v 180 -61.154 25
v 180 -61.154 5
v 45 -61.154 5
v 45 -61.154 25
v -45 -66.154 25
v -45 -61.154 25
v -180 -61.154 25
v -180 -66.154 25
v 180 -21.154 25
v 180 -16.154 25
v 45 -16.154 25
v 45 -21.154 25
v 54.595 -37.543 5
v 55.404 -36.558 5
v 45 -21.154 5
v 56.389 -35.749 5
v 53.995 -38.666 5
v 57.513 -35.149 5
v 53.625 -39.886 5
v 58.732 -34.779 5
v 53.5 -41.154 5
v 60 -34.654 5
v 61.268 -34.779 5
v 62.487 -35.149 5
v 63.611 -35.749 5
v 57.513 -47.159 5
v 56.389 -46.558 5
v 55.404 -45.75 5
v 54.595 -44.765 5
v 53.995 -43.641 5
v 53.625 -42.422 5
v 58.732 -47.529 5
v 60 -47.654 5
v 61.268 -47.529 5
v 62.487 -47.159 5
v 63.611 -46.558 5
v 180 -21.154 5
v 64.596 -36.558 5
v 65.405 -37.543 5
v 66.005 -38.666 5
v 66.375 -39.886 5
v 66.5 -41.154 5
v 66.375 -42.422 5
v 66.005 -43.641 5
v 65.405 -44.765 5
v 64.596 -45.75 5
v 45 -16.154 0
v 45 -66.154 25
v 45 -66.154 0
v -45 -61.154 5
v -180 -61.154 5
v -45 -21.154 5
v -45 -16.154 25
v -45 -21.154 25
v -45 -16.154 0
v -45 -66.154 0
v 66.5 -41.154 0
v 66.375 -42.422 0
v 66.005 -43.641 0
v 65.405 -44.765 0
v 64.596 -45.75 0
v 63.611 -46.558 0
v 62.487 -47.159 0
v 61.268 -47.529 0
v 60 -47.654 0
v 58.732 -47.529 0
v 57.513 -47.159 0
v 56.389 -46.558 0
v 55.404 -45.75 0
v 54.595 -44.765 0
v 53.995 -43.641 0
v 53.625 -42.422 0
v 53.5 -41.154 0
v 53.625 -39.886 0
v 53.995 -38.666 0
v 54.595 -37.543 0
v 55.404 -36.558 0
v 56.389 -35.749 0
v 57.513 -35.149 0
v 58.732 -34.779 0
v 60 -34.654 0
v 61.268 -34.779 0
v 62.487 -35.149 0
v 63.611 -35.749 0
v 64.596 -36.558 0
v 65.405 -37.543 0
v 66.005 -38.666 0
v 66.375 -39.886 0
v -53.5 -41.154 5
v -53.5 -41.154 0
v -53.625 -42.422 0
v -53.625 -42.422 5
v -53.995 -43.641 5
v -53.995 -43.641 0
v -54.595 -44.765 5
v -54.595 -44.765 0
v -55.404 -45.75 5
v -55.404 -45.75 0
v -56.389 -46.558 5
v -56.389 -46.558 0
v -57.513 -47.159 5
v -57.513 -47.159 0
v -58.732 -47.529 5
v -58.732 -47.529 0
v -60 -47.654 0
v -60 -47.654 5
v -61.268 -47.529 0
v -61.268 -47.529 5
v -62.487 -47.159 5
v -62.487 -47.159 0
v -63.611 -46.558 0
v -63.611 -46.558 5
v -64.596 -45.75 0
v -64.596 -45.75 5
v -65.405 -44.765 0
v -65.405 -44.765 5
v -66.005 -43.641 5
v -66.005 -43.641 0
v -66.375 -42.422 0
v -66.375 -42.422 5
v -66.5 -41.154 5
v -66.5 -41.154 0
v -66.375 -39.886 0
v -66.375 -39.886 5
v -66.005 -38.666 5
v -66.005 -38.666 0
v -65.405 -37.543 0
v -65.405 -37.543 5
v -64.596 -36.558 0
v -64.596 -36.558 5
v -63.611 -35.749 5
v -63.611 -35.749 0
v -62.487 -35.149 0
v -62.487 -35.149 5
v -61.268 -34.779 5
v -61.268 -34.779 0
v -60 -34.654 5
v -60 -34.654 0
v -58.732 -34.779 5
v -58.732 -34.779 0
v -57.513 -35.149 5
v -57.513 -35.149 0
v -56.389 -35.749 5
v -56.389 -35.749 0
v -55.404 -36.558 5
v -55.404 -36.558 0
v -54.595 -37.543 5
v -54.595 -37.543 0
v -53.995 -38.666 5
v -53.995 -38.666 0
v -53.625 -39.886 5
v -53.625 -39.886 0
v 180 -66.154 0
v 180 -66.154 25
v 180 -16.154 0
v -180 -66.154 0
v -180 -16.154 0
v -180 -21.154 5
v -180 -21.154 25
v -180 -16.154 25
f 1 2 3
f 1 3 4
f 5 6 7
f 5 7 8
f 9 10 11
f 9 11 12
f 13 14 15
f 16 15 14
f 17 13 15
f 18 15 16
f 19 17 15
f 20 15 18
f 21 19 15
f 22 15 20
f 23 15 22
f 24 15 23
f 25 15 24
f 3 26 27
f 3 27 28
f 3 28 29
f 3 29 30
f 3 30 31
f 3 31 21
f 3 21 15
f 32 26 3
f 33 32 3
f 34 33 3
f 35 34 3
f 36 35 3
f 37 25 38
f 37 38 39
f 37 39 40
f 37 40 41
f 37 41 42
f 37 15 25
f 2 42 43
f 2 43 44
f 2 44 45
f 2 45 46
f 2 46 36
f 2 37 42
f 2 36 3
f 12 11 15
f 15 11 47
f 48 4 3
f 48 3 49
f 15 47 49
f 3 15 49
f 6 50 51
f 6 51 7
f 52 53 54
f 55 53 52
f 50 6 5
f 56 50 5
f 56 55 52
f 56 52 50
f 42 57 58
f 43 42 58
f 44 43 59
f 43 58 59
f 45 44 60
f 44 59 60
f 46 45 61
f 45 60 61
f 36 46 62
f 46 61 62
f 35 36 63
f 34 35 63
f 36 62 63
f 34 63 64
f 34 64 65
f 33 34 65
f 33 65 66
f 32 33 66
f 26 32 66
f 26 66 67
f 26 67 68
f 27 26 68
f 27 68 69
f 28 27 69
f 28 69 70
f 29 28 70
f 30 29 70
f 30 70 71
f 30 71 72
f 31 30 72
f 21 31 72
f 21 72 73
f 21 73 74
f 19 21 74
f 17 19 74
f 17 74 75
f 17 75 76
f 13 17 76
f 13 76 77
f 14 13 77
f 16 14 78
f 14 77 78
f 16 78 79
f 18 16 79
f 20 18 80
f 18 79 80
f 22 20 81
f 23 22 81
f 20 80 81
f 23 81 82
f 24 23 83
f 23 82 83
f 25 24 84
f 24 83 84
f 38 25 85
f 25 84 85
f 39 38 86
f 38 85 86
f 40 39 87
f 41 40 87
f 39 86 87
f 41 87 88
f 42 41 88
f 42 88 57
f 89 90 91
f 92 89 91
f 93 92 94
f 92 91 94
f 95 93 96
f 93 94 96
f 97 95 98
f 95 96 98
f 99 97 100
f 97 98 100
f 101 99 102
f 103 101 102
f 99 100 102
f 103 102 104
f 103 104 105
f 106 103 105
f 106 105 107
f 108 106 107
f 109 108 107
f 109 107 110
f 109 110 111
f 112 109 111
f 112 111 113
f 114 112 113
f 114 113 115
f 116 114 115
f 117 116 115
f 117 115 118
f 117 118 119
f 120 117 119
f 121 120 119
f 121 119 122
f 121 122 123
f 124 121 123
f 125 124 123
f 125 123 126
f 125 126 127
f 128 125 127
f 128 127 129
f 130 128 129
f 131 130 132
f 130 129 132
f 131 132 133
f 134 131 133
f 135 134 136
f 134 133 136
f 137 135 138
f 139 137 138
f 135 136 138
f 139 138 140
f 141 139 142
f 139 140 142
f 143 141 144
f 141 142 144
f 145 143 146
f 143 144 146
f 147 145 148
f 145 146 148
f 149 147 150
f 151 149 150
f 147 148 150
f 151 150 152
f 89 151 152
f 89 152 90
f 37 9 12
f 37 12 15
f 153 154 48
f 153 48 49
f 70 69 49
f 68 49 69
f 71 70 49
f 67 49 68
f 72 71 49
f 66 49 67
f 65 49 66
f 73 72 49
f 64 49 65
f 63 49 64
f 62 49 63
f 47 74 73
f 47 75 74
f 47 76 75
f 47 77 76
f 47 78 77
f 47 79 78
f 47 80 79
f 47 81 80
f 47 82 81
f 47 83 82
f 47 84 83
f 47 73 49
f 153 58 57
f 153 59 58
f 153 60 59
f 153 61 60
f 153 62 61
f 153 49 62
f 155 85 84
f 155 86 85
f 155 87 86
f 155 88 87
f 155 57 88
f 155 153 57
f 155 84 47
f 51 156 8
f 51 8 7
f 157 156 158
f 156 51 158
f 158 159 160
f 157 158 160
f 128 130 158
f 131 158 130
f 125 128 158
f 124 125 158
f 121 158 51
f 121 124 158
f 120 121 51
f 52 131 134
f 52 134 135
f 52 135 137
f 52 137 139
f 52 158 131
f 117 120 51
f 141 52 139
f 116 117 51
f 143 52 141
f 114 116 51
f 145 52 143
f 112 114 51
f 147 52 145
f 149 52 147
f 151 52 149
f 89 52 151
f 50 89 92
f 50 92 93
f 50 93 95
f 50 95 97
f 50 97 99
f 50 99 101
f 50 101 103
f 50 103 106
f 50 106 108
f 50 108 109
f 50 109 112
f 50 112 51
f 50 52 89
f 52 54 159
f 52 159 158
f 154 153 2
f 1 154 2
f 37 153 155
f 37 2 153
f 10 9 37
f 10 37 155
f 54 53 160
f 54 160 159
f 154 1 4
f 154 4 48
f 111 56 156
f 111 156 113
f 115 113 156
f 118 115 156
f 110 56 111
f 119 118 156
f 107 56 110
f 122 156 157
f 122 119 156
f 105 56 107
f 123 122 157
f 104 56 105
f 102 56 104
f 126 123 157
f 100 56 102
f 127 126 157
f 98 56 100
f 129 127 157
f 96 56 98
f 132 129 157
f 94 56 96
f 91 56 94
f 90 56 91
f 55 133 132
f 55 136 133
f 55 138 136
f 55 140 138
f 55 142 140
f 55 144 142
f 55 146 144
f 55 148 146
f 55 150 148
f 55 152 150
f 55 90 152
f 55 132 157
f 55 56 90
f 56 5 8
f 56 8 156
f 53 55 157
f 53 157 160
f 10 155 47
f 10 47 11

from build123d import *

# Parameters (mm, degrees)
F1_DEPTH = 180
F2_R     = 6.5
F3_DEPTH = 25
F4_W     = 90
F4_H     = 50
F5_DEPTH = 25


with BuildPart() as f1:
    # F0 (on Right) → F1 (new body, symmetric)
    with BuildSketch(Plane.YZ):
        Polygon((-66.153837, 0), (-16.153837, 0), (-16.153837, 25), (-21.153837, 25), (-21.153837, 5), (-61.153837, 5), (-61.153837, 25), (-66.153837, 25), align=None)
    extrude(amount=F1_DEPTH, both=True)

    # F2 (on face) → F3 (cut)
    with BuildSketch(Plane(origin=(0, 0, 0), x_dir=(1, 0, 0), z_dir=(0, 0, -1))):
        with Locations((-60, 41.153837)):
            Circle(F2_R)
        with Locations((60, 41.153837)):
            Circle(F2_R)
    extrude(amount=-F3_DEPTH, mode=Mode.SUBTRACT)

    # F4 (on face) → F5 (cut)
    with BuildSketch(Plane(origin=(0, 0, 0), x_dir=(1, 0, 0), z_dir=(0, 0, -1))):
        with Locations((0, 41.153837)):
            Rectangle(F4_W, F4_H)
    extrude(amount=-F5_DEPTH, mode=Mode.SUBTRACT)


solid = f1.part
